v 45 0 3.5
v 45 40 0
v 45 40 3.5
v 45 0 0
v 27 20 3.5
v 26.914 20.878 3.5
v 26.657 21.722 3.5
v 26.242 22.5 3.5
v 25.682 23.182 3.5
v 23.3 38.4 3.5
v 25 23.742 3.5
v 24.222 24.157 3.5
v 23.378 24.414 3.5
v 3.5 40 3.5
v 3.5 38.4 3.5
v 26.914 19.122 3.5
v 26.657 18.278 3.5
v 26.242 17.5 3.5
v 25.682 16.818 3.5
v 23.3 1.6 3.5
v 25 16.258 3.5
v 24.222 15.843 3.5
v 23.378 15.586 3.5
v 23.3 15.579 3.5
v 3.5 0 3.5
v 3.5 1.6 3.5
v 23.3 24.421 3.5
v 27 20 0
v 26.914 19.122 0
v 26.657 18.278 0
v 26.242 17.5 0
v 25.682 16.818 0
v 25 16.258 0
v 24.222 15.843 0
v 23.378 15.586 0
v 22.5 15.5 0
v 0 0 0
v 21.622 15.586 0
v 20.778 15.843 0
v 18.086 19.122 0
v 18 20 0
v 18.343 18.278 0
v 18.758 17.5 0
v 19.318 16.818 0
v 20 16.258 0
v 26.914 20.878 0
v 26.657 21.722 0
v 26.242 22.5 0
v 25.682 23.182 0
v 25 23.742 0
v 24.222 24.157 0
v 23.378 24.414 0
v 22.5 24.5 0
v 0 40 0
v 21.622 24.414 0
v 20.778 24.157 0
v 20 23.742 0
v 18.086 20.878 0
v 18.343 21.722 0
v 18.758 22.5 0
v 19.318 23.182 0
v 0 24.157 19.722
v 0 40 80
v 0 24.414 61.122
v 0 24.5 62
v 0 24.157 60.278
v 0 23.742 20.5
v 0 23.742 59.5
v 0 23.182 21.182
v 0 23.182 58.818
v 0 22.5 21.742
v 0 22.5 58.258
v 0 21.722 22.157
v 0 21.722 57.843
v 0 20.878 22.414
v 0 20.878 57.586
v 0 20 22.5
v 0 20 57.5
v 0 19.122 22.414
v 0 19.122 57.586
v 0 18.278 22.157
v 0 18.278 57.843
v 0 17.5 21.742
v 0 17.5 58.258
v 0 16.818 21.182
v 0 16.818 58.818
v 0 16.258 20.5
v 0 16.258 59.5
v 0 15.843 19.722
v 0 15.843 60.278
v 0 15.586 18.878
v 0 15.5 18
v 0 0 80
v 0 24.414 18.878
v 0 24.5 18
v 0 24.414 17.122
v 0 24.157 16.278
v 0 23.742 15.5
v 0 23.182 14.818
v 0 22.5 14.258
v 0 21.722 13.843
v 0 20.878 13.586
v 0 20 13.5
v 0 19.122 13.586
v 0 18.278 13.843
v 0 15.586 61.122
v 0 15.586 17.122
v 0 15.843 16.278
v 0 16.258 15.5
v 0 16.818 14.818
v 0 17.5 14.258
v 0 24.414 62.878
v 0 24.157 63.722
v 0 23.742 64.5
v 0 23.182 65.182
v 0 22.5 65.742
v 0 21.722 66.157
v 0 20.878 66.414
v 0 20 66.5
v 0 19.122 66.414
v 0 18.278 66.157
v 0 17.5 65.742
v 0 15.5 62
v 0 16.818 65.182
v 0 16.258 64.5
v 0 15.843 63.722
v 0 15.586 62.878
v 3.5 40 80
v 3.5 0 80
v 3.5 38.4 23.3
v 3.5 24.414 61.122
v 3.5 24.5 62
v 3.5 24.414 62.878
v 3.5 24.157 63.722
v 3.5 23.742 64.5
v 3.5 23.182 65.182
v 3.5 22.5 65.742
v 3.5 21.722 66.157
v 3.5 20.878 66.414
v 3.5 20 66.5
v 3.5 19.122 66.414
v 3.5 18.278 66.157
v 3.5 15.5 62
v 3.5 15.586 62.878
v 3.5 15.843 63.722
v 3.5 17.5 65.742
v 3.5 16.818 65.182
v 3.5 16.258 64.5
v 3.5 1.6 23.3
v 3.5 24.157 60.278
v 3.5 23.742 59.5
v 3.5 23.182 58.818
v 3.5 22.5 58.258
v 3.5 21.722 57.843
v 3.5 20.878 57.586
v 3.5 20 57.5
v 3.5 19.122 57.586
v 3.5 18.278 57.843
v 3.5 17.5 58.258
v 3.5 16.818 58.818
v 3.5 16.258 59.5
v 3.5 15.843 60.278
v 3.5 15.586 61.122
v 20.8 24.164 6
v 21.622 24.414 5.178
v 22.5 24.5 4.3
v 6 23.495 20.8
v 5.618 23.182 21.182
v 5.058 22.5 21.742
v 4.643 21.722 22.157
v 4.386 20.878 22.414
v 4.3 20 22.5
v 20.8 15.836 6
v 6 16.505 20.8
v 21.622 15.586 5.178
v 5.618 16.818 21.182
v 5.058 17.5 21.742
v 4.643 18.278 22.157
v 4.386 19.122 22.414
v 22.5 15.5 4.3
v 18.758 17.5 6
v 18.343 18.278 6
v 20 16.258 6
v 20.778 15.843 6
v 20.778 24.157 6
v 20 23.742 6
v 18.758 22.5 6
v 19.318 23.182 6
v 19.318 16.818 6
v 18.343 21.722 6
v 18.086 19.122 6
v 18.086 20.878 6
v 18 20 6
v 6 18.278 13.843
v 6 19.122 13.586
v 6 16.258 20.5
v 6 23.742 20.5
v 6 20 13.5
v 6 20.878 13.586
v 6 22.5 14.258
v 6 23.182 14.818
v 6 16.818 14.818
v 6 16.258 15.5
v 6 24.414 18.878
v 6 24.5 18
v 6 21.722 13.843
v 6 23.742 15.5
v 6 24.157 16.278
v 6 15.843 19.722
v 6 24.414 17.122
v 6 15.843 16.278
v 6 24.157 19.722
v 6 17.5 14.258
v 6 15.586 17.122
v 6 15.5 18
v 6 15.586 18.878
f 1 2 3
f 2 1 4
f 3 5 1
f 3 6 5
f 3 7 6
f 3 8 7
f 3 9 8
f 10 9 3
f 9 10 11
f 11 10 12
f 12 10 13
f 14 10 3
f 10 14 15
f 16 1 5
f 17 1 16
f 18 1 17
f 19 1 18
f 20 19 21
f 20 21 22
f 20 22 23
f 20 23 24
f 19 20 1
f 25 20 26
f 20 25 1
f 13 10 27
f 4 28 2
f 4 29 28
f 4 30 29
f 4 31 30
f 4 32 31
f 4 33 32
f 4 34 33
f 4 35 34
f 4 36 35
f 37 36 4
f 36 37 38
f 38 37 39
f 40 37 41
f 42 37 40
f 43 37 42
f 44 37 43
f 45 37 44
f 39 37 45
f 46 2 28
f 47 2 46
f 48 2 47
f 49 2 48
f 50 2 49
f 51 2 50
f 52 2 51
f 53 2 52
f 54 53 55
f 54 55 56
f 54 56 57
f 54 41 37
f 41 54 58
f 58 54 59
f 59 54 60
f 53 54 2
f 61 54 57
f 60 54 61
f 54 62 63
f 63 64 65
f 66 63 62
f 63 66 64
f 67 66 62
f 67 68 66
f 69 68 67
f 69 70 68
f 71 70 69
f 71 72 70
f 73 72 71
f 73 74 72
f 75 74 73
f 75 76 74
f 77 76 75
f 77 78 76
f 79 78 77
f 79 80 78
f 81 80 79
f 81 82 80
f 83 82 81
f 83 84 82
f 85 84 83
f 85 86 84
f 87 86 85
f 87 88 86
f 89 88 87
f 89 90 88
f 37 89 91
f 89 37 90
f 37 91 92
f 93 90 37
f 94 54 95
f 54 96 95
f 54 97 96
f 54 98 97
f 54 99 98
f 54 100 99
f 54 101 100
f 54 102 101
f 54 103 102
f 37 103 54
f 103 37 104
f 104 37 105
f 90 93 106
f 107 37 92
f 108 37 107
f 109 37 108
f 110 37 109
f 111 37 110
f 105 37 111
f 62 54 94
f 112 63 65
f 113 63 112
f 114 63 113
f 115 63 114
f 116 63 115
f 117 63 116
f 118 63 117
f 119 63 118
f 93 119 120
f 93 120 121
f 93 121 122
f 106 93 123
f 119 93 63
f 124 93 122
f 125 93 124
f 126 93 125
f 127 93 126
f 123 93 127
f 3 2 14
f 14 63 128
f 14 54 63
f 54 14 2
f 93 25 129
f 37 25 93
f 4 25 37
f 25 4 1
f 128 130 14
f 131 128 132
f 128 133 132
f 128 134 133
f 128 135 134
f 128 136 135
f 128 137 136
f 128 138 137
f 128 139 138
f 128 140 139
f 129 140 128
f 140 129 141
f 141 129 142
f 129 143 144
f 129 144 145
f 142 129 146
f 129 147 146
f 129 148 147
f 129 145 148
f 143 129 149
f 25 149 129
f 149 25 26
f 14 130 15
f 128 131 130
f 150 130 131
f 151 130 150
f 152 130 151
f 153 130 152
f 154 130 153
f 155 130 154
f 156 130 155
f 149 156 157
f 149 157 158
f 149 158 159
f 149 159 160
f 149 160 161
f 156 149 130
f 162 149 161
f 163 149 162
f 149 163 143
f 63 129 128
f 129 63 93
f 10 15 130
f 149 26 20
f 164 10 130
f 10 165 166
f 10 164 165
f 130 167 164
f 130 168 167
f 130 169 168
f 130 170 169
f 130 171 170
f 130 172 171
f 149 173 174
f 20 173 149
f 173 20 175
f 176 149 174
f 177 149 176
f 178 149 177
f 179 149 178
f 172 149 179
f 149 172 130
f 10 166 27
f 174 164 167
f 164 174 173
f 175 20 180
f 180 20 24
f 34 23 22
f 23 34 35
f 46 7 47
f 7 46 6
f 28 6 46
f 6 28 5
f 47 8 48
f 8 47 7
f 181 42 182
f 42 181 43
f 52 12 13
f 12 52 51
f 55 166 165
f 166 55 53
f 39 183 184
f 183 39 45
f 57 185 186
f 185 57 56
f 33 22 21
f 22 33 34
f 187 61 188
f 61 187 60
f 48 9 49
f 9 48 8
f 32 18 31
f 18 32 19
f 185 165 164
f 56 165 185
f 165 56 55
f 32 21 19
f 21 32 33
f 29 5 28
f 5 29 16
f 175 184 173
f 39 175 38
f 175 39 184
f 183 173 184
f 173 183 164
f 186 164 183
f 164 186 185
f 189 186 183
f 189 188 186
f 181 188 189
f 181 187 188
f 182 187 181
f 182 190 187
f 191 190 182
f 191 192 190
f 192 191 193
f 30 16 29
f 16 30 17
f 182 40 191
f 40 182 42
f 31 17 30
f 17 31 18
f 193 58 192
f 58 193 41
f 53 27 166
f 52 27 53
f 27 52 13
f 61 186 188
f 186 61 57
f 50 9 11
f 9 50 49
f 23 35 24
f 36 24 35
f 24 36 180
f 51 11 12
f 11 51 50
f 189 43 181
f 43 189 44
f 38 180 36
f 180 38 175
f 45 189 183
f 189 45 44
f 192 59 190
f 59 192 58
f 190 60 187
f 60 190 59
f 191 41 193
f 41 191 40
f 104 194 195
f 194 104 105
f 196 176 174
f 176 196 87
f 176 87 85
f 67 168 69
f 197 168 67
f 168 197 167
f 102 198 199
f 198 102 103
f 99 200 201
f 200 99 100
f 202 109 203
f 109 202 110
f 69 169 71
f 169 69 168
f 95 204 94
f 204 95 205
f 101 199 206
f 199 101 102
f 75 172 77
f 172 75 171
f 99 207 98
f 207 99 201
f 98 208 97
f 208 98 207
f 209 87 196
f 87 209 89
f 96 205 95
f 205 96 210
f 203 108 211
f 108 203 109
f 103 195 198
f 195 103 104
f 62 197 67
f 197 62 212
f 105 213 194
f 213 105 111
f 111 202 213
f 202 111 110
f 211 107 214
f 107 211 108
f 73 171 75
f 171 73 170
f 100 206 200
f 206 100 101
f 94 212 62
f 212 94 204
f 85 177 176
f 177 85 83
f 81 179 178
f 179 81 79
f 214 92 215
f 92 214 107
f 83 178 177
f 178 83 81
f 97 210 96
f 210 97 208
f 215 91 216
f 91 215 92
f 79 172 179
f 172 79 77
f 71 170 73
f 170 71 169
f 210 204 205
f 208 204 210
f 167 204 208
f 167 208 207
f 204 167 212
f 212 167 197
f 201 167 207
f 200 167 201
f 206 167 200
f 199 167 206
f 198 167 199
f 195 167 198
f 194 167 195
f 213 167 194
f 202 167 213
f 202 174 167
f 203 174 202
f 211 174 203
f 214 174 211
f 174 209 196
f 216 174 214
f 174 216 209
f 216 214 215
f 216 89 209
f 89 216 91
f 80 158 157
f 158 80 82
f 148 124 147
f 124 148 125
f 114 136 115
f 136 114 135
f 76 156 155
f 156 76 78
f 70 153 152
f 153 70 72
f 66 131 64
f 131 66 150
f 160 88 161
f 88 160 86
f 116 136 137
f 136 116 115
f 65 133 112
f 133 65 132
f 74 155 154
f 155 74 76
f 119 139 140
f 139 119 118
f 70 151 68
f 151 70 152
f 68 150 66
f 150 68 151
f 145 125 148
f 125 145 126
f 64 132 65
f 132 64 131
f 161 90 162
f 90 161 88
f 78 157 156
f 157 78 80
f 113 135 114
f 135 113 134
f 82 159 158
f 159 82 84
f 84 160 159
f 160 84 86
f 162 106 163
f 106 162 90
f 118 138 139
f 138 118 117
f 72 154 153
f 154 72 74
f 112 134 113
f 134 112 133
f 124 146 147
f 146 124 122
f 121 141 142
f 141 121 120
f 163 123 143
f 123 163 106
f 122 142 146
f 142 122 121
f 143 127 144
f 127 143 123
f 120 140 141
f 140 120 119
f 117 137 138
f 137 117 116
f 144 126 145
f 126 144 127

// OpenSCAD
$fn = 32;

// ----------------------------------------------------------------------
// L-bracket: 45 x 40 x 80 mm
// ----------------------------------------------------------------------

// --- parameters (mm) ---
arm_x = 45;               // horizontal leg, X
arm_z = 80;               // vertical leg, Z
width = 40;               // bracket depth, Y
wall = 3.5;               // plate thickness
hole_d = 9;               // clearance for M8
rib_leg = 25.2;           // gusset leg
rib_sink = 1.6;           // gusset overlap into the plates

module hole_z(px, py) {
  translate([px, py, -2.5]) cylinder(h = wall + 5, d = hole_d);
}
module hole_x(pz, py) {
  translate([-2.5, py, pz]) rotate([0, 90, 0]) cylinder(h = wall + 5, d = hole_d);
}
module gusset() {
  translate([0, width - rib_sink, 0])
    rotate([90, 0, 0])
      linear_extrude(height = width - 2 * rib_sink)
        polygon(points = [[rib_sink, rib_sink], [rib_leg, rib_sink], [rib_sink, rib_leg]]);
}

difference() {
  union() {
    /* horizontal leg */
    cube([arm_x, width, wall]);
    /* vertical leg, overlapping the corner block */
    cube([wall, width, arm_z]);
    gusset();
  }
  hole_z(22.5, 20);
  hole_x(18, 20);
  hole_x(62, 20);
}
